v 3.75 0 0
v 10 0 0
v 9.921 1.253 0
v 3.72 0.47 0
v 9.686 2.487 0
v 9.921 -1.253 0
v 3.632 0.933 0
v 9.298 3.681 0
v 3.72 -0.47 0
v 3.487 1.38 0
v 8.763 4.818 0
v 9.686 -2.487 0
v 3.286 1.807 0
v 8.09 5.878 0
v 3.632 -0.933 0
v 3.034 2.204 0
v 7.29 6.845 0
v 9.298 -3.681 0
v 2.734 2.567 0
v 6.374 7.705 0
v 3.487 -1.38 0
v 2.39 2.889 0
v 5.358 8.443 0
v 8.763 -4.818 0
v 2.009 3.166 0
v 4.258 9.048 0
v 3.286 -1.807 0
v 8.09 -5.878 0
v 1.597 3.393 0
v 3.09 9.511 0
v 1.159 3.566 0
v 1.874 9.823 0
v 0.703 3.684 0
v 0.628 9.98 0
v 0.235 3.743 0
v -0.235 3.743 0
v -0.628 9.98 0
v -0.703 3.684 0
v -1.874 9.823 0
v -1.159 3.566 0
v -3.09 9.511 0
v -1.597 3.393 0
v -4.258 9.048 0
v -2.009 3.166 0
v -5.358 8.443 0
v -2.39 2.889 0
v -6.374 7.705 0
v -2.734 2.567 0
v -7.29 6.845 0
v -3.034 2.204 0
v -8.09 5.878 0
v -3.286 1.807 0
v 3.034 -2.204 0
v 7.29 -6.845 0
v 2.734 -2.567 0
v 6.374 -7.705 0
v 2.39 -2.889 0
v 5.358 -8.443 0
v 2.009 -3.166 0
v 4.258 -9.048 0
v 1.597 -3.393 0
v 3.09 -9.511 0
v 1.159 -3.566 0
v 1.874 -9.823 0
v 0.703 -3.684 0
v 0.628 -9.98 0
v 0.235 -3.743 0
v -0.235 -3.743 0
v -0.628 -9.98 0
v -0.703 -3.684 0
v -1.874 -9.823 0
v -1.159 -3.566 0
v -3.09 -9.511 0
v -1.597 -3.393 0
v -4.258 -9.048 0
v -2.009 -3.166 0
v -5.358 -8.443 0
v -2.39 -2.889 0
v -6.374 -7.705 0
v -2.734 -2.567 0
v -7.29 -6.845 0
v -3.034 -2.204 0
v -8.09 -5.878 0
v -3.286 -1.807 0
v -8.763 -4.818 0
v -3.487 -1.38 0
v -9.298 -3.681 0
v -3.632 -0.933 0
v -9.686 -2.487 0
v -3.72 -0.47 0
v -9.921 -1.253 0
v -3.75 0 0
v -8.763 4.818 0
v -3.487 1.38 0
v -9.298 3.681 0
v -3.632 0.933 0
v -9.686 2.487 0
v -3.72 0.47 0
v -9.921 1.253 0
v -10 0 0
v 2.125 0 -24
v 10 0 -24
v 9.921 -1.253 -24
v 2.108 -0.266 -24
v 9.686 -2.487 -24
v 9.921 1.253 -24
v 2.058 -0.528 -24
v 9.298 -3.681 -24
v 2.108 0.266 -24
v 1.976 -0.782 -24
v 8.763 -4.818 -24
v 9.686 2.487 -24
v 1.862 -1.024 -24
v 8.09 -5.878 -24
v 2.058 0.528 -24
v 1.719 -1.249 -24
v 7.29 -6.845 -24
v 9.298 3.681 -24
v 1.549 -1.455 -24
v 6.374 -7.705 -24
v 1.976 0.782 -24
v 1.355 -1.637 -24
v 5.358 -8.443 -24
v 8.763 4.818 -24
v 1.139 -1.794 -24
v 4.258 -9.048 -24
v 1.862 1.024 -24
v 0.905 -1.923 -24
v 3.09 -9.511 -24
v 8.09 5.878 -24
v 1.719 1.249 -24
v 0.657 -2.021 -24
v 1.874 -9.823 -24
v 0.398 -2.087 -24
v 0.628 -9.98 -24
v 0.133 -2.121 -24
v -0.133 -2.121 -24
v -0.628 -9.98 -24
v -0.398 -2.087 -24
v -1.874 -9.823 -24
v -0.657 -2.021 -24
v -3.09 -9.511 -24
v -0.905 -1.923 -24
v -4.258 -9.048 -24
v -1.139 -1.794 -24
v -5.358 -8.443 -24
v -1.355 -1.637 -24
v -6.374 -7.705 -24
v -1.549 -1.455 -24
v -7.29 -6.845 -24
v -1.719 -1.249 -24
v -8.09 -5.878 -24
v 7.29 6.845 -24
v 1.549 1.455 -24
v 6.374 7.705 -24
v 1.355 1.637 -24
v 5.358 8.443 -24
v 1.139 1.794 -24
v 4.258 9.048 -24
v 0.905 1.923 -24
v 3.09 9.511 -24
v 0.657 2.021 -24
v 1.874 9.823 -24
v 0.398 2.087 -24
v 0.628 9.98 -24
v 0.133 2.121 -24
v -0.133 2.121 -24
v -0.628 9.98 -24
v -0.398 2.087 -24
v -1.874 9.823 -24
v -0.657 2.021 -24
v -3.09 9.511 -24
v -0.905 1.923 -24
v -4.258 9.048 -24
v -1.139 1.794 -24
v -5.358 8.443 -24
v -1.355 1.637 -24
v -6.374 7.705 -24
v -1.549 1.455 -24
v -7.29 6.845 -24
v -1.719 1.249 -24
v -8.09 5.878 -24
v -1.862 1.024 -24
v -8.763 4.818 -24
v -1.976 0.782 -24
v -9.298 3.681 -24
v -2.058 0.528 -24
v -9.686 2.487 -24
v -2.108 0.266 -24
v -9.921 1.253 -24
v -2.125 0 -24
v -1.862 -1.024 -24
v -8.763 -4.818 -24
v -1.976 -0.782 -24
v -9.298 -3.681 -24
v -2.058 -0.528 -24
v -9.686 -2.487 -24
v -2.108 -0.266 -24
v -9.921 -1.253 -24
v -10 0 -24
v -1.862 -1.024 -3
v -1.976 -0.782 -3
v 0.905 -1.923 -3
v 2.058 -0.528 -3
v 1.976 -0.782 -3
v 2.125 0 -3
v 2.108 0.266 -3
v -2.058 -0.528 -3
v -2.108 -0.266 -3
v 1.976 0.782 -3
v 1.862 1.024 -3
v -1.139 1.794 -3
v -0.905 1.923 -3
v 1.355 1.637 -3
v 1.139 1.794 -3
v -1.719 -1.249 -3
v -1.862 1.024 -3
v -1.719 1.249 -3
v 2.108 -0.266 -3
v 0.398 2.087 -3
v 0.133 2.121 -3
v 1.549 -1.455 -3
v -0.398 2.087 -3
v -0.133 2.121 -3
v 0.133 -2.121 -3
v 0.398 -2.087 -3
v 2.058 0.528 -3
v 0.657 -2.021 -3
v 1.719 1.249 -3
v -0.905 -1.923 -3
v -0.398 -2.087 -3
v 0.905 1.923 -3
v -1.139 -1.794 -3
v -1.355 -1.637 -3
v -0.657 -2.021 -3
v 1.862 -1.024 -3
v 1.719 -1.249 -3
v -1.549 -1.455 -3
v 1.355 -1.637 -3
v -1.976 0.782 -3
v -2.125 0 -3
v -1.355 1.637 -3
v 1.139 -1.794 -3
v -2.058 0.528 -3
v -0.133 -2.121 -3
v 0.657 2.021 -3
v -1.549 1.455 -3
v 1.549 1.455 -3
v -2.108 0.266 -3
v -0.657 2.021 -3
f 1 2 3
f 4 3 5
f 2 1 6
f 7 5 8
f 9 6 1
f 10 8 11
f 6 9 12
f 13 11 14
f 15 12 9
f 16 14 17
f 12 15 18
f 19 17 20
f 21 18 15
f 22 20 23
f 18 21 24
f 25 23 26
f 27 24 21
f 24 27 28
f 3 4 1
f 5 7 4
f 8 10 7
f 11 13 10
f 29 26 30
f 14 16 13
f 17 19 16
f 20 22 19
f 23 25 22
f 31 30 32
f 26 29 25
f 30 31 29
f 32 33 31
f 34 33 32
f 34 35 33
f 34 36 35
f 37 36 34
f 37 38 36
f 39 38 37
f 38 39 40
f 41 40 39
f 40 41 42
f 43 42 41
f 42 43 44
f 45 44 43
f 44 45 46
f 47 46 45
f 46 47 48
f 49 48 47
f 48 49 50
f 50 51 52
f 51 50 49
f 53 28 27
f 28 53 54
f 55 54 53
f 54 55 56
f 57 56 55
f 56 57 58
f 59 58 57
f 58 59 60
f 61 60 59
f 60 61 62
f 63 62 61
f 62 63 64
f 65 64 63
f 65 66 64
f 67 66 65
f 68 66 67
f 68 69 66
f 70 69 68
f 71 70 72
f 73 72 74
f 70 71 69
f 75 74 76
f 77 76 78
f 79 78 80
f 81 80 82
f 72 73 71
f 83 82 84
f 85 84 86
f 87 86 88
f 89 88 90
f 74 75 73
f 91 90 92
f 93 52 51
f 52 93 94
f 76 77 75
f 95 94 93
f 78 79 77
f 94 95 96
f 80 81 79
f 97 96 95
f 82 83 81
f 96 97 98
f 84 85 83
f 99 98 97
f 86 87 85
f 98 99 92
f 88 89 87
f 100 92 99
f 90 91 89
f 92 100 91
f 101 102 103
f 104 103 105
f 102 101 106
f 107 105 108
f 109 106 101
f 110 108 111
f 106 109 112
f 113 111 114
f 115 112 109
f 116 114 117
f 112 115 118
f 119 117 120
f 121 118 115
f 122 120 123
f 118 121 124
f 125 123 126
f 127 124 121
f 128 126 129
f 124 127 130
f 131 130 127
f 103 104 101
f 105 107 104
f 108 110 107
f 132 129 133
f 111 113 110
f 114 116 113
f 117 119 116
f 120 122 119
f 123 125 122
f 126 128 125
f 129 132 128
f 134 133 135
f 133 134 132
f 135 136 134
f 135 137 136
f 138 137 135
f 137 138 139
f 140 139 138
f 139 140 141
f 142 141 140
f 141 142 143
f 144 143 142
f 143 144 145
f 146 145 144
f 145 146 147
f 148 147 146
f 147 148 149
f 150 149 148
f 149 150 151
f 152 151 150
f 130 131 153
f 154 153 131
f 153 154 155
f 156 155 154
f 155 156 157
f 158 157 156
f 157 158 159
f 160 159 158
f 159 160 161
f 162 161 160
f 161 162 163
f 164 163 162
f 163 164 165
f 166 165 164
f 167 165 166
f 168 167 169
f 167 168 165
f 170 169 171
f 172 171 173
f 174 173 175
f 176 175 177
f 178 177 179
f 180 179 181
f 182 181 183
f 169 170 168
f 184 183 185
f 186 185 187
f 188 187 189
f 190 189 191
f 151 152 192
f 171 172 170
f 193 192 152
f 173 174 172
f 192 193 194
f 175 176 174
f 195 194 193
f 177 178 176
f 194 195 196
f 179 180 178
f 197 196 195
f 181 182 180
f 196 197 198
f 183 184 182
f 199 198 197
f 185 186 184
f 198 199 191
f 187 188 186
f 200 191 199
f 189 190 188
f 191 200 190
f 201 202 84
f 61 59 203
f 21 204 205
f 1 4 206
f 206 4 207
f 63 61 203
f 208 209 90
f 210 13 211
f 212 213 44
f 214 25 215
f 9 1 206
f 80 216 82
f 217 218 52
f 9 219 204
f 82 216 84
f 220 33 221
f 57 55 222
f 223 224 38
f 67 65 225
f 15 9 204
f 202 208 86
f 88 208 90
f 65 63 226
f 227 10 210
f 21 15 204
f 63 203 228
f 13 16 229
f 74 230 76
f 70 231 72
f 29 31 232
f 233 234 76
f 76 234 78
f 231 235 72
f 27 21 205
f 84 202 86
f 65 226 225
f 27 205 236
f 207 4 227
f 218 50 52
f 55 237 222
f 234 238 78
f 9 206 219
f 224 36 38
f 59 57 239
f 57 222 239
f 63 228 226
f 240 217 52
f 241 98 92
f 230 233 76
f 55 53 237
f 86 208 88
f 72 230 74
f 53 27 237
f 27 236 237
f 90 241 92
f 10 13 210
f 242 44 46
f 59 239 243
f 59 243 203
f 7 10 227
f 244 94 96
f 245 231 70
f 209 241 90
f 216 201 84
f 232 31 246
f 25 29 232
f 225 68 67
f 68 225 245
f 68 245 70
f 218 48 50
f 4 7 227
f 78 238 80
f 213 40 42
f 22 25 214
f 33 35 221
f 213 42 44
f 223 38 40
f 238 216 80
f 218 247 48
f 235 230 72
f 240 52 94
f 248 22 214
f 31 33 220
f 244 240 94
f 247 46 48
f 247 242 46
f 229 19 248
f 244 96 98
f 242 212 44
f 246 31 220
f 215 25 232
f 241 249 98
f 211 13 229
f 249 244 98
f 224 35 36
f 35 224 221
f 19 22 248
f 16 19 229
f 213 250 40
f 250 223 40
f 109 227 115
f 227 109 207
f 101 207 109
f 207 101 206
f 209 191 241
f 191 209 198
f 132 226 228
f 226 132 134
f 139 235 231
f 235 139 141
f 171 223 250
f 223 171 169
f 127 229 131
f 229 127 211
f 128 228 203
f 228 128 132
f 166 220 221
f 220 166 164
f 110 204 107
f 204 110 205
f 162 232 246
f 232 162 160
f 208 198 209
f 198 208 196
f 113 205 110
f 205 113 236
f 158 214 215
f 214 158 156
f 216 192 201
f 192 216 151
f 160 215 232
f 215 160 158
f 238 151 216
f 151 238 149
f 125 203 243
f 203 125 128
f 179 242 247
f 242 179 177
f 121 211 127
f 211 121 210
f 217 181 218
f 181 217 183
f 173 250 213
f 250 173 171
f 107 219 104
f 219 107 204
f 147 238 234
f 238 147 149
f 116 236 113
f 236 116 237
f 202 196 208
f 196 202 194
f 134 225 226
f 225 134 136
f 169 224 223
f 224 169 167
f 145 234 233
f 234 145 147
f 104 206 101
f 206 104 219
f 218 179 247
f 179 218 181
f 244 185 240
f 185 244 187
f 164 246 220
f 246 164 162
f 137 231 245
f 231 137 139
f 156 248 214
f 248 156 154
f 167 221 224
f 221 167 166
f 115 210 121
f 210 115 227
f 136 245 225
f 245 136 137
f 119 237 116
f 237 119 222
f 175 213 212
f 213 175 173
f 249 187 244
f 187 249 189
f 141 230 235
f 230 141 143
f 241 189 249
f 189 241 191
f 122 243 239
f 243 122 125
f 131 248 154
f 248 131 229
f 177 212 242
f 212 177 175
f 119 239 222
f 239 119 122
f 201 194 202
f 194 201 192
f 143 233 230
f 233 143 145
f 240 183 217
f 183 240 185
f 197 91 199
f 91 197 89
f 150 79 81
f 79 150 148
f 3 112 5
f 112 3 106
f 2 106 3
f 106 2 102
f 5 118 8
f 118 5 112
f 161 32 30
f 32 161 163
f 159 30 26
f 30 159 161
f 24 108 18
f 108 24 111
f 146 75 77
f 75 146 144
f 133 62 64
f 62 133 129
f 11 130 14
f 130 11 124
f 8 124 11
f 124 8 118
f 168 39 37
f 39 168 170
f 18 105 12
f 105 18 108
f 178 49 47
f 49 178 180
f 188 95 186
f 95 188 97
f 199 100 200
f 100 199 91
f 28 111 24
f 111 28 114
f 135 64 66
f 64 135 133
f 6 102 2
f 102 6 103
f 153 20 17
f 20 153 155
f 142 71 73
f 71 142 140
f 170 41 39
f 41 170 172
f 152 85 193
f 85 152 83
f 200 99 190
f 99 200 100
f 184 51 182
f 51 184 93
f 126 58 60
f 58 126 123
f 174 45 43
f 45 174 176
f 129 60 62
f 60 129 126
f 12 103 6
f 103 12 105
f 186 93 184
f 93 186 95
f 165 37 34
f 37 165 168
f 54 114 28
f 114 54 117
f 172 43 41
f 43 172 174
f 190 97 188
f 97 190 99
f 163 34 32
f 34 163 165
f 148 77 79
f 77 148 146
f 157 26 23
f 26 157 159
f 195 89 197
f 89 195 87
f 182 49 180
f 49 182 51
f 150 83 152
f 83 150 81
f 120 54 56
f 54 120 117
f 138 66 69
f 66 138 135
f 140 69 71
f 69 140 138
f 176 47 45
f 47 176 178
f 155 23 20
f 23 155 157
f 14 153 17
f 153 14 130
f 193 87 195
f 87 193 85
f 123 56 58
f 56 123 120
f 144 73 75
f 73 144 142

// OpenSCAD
$fn = 50;


difference() {
	union() {
		translate(v = [0, 0, -24.0000000000]) {
			cylinder(h = 24, r = 10.0000000000);
		}
		cylinder(h = 0, r = 20.0000000000);
	}
	union() {
		translate(v = [0, 0, 0]) {
			rotate(a = [0, 0, 0]) {
				difference() {
					union() {
						#translate(v = [0, 0, -24.0000000000]) {
							cylinder(h = 24, r = 2.0000000000);
						}
						#translate(v = [0, 0, -3]) {
							cylinder(h = 3, r1 = 2.1250000000, r2 = 3.7500000000);
						}
						#translate(v = [0, 0, -24.0000000000]) {
							cylinder(h = 24, r = 2.1250000000);
						}
						#translate(v = [0, 0, -24.0000000000]) {
							cylinder(h = 24, r = 2.0000000000);
						}
					}
					union();
				}
			}
		}
	}
}
